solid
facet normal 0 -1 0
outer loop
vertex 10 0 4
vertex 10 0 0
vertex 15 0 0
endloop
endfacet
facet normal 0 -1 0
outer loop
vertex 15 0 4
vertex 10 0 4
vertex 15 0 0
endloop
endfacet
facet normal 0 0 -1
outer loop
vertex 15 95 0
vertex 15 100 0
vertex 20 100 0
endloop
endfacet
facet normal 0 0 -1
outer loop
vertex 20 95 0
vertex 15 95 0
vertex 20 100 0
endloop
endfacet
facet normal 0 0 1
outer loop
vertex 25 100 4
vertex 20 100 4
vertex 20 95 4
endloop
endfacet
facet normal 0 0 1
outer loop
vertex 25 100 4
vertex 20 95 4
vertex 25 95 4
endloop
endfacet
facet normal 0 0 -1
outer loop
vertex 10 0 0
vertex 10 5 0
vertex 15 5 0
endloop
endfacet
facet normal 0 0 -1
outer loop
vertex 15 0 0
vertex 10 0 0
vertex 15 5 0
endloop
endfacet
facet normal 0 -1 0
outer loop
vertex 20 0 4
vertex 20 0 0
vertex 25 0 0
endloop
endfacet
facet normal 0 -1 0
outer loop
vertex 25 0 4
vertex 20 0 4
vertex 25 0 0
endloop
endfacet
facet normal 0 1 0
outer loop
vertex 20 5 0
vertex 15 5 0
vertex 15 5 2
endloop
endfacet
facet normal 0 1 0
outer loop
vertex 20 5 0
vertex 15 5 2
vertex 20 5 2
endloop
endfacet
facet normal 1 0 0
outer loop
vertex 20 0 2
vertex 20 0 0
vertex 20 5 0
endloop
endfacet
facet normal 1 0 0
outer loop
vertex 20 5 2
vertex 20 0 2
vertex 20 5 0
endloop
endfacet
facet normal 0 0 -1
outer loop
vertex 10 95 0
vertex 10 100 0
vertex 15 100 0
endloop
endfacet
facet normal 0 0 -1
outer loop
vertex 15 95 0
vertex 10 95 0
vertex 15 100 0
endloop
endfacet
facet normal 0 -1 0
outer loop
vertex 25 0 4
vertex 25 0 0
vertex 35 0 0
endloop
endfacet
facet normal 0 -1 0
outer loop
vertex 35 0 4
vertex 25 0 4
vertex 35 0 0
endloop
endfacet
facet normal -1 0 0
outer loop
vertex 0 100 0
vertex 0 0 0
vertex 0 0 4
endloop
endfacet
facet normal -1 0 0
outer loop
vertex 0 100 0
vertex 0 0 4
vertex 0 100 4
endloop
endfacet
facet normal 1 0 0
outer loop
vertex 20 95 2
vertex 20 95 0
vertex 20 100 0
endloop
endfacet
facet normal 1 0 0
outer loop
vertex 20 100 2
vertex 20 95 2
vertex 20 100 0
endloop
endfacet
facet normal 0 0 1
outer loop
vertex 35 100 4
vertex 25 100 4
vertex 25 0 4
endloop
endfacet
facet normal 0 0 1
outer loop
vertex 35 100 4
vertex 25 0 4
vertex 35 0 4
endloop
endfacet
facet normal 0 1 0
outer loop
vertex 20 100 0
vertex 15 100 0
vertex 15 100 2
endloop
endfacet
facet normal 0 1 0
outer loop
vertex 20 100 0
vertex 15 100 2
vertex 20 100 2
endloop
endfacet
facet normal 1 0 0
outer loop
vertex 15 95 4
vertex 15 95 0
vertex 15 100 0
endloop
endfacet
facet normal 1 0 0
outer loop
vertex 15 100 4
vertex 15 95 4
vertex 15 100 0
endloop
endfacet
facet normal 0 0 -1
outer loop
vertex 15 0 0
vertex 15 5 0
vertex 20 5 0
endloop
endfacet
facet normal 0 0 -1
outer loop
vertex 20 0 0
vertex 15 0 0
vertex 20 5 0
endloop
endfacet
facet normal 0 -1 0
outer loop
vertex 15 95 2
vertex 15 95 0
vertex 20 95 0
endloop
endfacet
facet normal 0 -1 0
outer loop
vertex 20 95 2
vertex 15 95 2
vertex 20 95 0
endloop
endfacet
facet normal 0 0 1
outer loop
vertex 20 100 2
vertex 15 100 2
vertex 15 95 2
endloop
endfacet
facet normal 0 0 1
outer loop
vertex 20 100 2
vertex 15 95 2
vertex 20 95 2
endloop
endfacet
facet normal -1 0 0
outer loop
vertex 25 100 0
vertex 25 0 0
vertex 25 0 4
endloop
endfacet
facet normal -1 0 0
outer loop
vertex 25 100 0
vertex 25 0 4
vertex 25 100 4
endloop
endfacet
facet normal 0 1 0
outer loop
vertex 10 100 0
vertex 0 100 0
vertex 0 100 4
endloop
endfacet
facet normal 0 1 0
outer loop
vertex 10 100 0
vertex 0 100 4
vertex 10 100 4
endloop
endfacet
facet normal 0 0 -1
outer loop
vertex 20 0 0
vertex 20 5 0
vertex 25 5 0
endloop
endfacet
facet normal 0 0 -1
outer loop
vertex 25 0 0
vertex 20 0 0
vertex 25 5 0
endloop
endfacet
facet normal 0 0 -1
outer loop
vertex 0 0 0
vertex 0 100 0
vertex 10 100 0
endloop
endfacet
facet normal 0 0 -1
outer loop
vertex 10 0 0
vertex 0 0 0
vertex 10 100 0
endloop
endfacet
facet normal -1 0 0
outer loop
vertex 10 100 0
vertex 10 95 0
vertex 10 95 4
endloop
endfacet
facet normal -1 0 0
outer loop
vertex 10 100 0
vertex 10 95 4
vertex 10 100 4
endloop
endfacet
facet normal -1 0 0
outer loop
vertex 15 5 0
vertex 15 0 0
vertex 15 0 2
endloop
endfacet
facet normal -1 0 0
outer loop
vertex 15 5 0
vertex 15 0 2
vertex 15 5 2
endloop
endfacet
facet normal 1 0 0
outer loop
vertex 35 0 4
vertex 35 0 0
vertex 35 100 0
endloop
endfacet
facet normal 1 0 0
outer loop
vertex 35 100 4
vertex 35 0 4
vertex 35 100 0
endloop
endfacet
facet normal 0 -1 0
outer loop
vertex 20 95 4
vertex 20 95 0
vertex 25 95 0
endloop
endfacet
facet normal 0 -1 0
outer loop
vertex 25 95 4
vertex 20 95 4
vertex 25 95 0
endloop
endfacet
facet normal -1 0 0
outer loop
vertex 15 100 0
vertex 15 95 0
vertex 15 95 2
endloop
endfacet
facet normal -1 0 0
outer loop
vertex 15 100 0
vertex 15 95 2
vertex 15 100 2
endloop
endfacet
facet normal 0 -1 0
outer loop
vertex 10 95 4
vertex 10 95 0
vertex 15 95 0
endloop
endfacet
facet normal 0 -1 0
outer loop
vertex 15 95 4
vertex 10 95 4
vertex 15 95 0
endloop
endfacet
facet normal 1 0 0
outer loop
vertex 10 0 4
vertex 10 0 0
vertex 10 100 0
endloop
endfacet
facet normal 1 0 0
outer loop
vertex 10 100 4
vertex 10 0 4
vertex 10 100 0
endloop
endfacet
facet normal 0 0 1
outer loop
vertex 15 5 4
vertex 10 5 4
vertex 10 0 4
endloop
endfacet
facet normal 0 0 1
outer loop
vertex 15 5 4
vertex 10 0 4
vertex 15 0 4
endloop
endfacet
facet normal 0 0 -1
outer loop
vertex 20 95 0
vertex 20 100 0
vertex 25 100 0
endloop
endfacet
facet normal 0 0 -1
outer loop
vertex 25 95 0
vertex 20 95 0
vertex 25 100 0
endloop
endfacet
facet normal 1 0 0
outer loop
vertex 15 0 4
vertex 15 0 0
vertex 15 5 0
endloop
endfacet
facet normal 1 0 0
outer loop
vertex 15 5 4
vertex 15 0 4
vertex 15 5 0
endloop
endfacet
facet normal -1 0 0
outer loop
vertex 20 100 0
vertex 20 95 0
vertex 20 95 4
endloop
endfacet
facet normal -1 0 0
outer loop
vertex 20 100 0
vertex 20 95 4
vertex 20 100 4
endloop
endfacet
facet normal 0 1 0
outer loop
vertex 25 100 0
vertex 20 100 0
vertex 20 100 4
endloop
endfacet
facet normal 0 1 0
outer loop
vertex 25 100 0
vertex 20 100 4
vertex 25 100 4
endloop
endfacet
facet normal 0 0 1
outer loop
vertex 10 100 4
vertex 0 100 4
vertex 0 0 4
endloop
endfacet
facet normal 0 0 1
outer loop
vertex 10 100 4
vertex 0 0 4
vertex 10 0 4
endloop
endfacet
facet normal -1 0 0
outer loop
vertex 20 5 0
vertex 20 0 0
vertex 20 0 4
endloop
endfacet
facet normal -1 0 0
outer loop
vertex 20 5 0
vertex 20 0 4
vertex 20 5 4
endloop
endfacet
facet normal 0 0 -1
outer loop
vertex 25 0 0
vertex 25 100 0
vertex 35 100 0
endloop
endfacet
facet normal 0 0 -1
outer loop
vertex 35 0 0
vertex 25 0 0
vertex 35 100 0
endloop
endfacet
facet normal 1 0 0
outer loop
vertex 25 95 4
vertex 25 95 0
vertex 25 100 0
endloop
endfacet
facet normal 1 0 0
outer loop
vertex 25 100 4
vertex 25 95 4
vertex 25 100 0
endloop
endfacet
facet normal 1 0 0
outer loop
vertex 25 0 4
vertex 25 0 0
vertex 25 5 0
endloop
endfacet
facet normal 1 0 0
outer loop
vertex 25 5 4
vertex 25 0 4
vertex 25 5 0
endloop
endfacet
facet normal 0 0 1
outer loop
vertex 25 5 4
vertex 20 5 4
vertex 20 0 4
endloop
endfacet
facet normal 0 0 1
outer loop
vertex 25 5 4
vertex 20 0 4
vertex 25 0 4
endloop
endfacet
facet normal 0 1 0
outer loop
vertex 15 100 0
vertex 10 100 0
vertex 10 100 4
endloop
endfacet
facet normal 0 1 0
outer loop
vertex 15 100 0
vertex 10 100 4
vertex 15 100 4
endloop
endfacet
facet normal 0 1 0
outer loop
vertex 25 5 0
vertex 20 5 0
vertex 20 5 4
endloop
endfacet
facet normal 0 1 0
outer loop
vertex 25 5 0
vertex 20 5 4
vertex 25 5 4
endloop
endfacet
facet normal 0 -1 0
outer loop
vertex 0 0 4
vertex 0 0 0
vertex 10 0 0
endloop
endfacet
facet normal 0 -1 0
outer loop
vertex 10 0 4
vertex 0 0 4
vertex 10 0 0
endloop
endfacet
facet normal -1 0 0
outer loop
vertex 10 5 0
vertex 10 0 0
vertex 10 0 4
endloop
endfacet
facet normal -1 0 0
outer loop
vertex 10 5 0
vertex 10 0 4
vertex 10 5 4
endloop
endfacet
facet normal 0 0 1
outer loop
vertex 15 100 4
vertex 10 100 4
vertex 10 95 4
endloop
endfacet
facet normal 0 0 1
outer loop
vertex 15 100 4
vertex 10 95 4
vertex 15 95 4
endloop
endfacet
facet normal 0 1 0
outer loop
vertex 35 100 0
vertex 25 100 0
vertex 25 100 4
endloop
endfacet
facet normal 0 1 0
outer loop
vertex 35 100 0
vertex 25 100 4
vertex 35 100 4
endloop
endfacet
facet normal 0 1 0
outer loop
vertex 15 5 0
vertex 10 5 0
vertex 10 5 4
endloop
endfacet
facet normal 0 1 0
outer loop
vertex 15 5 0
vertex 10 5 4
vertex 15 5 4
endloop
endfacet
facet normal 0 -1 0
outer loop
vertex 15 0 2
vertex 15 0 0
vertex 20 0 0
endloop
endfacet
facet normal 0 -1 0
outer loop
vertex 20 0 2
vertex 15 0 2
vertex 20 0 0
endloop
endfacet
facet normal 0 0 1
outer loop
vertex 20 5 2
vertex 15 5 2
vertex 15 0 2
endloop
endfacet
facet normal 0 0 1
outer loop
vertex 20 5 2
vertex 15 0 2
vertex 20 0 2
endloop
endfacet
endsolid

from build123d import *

# Parameters (mm, degrees)
F1_W     = 10
F1_H     = 100
F4_DEPTH = 4
F3_W     = 5
F3_H     = 5
F5_DEPTH = 4
F2_W     = 5
F2_H     = 5
F6_DEPTH = 2


with BuildPart() as f4:
    # F1 (on face) → F4 (new body)
    with BuildSketch(Plane.XY):
        with Locations((5, 50)):
            Rectangle(F1_W, F1_H)
        with Locations((30, 50)):
            Rectangle(F1_W, F1_H)
    extrude(amount=F4_DEPTH)


with BuildPart() as f5:
    # F3 (on face) → F5 (new body)
    with BuildSketch(Plane.XY):
        with Locations((12.5, 97.5)):
            Rectangle(F3_W, F3_H)
        with Locations((22.5, 97.5)):
            Rectangle(F3_W, F3_H)
        with Locations((12.5, 2.5)):
            Rectangle(F3_W, F3_H)
        with Locations((22.5, 2.5)):
            Rectangle(F3_W, F3_H)
    extrude(amount=F5_DEPTH)


with BuildPart() as f6:
    # F2 (on face) → F6 (new body)
    with BuildSketch(Plane.XY):
        with Locations((17.5, 97.5)):
            Rectangle(F2_W, F2_H)
        with Locations((17.5, 2.5)):
            Rectangle(F2_W, F2_H)
    extrude(amount=F6_DEPTH)


solid = Compound([f4.part, f5.part, f6.part])
